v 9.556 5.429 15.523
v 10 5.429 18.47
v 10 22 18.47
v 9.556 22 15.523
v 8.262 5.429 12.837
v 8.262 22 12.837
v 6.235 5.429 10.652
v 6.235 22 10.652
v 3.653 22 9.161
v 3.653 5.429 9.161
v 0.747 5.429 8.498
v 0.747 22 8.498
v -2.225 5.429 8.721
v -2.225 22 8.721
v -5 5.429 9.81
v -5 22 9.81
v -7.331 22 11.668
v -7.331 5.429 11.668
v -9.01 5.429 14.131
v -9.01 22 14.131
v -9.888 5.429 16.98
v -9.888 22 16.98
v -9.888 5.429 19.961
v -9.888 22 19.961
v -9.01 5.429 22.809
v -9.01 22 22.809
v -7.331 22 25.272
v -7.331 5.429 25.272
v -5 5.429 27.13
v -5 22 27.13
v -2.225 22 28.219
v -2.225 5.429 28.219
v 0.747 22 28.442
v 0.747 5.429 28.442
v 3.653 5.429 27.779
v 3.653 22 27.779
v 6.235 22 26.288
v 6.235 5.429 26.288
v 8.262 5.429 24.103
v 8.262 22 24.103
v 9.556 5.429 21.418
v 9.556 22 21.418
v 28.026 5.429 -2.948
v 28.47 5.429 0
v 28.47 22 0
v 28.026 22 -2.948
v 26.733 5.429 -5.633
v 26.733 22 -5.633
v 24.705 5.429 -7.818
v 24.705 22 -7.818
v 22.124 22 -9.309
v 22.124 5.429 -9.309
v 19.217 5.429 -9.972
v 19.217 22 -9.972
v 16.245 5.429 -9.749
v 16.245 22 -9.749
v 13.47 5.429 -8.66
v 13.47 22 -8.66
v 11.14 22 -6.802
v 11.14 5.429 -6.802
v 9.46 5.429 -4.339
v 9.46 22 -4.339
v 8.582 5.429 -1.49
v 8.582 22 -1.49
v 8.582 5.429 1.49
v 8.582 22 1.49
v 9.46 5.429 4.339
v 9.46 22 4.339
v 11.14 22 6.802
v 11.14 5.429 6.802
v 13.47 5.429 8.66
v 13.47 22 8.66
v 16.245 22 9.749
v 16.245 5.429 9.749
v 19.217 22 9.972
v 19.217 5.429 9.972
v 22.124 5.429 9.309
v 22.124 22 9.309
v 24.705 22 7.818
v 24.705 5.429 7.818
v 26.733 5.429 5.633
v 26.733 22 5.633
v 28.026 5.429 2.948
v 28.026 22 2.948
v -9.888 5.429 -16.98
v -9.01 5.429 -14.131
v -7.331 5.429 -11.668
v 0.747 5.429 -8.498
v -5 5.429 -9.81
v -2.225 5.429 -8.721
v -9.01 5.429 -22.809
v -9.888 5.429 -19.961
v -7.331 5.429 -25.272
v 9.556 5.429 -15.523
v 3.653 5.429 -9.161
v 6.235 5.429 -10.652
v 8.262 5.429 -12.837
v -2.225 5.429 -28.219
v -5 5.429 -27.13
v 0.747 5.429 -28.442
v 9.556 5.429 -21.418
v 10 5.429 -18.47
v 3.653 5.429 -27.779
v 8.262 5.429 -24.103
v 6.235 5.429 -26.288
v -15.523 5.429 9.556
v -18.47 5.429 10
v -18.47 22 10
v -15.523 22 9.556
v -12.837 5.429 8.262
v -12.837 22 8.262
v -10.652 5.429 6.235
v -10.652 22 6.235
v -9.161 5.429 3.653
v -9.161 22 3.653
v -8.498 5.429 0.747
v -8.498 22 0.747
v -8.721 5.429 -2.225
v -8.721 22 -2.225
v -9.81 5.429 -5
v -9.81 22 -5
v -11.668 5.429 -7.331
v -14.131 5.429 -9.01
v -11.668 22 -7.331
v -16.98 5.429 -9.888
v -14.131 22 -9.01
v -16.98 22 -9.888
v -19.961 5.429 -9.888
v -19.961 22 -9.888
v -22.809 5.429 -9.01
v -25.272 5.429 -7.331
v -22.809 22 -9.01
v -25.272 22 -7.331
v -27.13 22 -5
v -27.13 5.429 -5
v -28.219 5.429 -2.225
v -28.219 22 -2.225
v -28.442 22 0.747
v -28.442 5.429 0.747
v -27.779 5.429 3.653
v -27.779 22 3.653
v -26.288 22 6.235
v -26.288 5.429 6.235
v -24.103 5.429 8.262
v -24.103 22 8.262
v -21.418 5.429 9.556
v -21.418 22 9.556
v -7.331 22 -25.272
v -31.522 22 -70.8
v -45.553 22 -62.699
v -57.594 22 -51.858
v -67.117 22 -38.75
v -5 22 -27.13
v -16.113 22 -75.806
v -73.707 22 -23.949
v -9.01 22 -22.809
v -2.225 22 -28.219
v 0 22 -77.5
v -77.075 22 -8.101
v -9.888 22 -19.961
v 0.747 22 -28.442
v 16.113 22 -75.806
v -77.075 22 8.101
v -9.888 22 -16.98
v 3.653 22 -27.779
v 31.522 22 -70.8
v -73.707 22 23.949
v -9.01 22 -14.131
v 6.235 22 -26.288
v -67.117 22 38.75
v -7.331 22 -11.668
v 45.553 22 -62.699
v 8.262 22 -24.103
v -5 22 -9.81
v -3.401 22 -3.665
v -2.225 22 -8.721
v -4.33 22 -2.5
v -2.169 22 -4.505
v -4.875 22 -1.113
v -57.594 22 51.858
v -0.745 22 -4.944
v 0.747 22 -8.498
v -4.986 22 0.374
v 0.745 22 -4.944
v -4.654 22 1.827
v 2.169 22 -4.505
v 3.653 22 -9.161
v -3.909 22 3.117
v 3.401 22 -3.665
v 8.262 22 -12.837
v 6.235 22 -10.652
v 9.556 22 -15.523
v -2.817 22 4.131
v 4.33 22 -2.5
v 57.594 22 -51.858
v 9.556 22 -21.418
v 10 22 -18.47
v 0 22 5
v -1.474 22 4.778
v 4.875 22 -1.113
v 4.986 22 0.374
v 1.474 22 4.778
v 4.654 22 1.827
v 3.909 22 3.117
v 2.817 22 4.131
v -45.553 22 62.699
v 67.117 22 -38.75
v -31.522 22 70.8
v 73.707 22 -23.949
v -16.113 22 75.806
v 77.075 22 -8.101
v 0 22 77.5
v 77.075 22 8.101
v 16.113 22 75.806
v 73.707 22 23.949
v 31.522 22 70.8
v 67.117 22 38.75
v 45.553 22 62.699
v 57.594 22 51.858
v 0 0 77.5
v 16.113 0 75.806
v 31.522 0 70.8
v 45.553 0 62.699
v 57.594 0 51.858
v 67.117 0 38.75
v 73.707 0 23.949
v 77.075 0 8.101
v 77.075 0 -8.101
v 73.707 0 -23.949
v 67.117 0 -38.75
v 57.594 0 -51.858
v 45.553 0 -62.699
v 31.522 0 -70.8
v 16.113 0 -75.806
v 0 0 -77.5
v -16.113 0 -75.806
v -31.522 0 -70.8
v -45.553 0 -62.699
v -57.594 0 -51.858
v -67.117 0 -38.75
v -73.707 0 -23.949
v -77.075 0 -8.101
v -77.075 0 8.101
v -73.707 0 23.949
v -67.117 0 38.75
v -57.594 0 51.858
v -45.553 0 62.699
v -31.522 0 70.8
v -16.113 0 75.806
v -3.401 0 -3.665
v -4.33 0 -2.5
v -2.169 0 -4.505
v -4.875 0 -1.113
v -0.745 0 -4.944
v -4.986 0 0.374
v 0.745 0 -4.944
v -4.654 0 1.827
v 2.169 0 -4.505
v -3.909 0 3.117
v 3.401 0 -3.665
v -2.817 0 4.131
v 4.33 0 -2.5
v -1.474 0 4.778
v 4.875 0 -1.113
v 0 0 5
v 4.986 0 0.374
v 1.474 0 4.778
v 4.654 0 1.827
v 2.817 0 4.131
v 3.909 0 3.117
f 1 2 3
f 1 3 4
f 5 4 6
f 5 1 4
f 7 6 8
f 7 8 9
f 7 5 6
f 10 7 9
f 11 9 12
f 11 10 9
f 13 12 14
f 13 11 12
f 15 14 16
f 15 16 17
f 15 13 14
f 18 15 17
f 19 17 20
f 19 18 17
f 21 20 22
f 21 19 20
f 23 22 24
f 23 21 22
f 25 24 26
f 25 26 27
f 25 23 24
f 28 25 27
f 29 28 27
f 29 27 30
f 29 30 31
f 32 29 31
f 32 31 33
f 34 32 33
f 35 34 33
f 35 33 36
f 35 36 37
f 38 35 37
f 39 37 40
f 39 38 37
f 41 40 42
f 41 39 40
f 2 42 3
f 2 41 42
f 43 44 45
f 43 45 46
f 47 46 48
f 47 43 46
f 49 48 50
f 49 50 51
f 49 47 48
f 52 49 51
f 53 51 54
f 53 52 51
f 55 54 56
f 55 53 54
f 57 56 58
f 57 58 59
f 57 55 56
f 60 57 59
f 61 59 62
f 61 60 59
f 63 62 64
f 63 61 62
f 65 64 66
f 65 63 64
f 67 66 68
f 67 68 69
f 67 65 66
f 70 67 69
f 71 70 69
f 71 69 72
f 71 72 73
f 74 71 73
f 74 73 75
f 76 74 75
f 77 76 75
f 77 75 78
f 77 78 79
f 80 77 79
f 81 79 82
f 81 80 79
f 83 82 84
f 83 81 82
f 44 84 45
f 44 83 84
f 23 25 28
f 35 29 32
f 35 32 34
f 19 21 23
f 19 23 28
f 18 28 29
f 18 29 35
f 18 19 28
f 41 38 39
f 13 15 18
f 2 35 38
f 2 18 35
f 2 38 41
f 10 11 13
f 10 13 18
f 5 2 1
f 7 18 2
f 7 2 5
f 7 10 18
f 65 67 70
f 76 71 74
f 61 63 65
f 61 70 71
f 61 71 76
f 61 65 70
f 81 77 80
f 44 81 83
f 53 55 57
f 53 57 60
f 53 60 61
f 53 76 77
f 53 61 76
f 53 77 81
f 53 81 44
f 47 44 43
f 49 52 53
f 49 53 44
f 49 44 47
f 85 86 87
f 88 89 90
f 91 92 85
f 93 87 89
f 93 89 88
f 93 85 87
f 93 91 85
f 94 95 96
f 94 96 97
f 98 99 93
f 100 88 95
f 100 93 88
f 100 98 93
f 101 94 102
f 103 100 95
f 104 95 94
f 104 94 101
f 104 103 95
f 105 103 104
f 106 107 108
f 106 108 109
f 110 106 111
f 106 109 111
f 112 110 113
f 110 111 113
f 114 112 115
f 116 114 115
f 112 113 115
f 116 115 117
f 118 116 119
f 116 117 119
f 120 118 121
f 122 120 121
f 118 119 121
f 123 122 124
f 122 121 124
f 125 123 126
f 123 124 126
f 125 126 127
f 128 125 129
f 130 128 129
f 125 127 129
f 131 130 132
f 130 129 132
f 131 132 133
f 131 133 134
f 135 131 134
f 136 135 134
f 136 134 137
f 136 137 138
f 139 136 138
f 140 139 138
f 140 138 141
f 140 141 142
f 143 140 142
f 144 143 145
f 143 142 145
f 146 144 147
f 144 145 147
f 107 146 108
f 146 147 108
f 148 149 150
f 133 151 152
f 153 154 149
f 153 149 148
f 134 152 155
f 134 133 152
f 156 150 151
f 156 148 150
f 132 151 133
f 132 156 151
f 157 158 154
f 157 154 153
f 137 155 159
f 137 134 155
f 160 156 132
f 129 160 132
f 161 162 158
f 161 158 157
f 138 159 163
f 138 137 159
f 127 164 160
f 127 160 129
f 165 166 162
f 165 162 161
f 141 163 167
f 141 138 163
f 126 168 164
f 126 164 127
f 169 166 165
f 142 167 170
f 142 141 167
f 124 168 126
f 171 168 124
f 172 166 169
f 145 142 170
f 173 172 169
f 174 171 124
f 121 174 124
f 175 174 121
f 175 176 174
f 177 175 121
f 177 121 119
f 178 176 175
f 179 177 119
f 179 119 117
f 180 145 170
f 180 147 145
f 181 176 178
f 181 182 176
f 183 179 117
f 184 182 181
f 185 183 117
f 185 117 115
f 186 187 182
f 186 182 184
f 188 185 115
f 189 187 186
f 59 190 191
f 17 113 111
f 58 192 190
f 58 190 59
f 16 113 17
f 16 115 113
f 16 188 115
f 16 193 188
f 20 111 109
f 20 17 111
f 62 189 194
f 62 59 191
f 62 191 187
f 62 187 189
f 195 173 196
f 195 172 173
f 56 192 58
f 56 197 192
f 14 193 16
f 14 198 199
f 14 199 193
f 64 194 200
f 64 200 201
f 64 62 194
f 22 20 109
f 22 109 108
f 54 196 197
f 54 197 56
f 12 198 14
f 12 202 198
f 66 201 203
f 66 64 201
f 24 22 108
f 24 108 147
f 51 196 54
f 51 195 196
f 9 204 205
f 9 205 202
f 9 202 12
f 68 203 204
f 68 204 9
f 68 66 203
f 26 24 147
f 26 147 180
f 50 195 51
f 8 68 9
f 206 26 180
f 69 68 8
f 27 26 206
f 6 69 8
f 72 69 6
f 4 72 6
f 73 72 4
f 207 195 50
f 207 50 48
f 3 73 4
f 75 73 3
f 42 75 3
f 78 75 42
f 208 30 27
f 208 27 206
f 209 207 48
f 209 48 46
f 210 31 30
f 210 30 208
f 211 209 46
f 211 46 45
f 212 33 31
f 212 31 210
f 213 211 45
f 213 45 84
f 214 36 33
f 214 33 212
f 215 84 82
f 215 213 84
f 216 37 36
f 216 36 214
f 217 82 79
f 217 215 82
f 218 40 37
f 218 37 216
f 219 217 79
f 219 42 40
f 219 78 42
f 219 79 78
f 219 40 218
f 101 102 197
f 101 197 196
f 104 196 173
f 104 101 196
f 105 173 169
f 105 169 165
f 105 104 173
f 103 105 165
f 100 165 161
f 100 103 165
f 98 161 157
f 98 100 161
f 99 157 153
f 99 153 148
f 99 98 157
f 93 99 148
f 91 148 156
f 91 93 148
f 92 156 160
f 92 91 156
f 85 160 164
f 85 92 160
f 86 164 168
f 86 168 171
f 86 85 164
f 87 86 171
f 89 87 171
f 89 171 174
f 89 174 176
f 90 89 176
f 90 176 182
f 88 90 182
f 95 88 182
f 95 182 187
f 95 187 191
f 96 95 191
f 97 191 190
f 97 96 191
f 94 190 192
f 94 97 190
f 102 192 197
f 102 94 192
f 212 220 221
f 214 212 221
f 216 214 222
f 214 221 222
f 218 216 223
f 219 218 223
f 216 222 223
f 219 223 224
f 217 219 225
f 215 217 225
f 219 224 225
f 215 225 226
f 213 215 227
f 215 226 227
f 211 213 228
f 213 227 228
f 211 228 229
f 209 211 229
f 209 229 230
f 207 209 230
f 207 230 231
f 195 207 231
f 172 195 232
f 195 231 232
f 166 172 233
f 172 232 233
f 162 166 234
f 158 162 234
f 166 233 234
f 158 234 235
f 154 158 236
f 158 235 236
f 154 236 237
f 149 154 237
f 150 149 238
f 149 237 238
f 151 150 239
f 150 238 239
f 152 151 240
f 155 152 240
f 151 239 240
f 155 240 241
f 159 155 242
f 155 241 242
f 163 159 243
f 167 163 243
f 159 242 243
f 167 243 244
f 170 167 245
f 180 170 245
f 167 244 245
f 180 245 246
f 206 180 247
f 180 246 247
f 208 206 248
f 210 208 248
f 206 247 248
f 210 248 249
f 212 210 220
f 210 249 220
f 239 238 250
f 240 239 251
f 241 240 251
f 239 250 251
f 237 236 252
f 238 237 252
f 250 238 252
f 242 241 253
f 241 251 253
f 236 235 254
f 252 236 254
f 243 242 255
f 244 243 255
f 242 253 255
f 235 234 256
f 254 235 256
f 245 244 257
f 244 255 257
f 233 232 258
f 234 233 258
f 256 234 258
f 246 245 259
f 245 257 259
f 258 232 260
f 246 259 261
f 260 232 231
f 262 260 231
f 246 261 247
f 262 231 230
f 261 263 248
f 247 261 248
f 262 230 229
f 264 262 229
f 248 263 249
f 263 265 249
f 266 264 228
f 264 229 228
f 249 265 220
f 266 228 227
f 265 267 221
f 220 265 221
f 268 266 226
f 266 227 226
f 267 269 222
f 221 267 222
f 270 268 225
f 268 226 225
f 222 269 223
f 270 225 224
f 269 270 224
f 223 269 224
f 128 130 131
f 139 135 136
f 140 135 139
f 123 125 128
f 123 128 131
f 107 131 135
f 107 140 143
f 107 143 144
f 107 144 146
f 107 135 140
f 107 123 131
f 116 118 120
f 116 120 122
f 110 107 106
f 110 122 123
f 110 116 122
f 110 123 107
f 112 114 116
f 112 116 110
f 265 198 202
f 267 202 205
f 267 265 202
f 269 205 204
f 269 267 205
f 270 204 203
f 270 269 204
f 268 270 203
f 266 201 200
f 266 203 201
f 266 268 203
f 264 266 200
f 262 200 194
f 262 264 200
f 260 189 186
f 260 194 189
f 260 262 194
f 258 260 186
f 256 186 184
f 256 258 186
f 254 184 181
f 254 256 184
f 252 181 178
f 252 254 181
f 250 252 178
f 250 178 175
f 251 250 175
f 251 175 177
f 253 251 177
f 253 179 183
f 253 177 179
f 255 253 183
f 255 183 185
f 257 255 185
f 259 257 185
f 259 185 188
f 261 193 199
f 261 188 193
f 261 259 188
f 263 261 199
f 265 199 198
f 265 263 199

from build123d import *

# Parameters (mm, degrees)
SKETCH1_R           = 77.5
BOSS_EXTRUDE1_DEPTH = 22
SKETCH2_R           = 5
CUT_EXTRUDE1_DEPTH  = 112.787745303
SKETCH3_R           = 10
CUT_EXTRUDE2_DEPTH  = 16.571082055
CIRPATTERN1_COUNT   = 4


with BuildPart() as part:
    # Sketch1 → Boss-Extrude1 (new body)
    with BuildSketch(Plane(origin=(0, 0, 0), x_dir=(1, 0, 0), z_dir=(0, 1, 0))):
        Circle(SKETCH1_R)
    extrude(amount=BOSS_EXTRUDE1_DEPTH)

    # Sketch2 → Cut-Extrude1 (cut, through all)
    with BuildSketch(Plane(origin=(0, 0, 0), x_dir=(1, 0, 0), z_dir=(0, 1, 0))):
        Circle(SKETCH2_R)
    extrude(amount=CUT_EXTRUDE1_DEPTH, mode=Mode.SUBTRACT)

    # Sketch3 → Cut-Extrude2 (cut)
    with BuildSketch(Plane(origin=(0, 22, 0), x_dir=(1, 0, 0), z_dir=(0, 1, 0))):
        with Locations((-18.470166118, 0)):
            Circle(SKETCH3_R)
    cut_extrude2 = extrude(amount=-CUT_EXTRUDE2_DEPTH, mode=Mode.SUBTRACT)

    # CirPattern1: Cut-Extrude2 ×4 about axis
    cirpattern1_axis = Axis((0, 0, 0), (0, 1, 0))
    for i in range(1, CIRPATTERN1_COUNT):
        add(cut_extrude2.rotate(cirpattern1_axis, i * 360 / CIRPATTERN1_COUNT), mode=Mode.SUBTRACT)


solid = part.part
